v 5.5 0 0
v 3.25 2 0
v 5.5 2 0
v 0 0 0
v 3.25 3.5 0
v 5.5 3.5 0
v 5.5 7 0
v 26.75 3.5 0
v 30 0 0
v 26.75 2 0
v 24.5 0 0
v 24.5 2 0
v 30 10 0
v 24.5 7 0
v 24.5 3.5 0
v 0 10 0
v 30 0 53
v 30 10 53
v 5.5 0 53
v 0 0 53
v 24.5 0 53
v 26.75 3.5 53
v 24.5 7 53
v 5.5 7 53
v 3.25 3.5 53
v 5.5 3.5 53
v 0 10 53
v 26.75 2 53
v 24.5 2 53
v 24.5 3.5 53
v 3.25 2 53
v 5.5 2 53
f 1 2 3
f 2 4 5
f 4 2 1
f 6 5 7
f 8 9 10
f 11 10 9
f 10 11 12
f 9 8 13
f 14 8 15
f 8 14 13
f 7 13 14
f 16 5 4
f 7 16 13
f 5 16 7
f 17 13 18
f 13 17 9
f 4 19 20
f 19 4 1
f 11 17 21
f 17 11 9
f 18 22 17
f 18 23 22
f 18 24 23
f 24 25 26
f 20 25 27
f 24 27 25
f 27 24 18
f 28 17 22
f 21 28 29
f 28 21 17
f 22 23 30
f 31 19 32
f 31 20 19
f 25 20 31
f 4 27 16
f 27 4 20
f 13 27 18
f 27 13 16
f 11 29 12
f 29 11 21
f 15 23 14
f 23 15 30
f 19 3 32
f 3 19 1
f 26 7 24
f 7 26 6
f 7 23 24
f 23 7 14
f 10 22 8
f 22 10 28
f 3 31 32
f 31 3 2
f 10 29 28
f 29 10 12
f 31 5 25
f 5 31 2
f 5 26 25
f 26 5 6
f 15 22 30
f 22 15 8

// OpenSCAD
a=[[0,0],[30,0],[30,10],[0,10]]; //тело
 b=[[3,0,1,2]];

c=[[0,0],[19,0],[19,7],[0,7]]; // выемка

d=[[0,0],[23.5,0],[23.5,1.5],[0,1.5]]; //прорезь

difference() {
difference() {
  linear_extrude(53) polygon(a);  
    linear_extrude(53) translate ([5.5,0,0]) polygon(c);
 }

  linear_extrude(53) translate ([3.25,2,0]) polygon(d);  }
